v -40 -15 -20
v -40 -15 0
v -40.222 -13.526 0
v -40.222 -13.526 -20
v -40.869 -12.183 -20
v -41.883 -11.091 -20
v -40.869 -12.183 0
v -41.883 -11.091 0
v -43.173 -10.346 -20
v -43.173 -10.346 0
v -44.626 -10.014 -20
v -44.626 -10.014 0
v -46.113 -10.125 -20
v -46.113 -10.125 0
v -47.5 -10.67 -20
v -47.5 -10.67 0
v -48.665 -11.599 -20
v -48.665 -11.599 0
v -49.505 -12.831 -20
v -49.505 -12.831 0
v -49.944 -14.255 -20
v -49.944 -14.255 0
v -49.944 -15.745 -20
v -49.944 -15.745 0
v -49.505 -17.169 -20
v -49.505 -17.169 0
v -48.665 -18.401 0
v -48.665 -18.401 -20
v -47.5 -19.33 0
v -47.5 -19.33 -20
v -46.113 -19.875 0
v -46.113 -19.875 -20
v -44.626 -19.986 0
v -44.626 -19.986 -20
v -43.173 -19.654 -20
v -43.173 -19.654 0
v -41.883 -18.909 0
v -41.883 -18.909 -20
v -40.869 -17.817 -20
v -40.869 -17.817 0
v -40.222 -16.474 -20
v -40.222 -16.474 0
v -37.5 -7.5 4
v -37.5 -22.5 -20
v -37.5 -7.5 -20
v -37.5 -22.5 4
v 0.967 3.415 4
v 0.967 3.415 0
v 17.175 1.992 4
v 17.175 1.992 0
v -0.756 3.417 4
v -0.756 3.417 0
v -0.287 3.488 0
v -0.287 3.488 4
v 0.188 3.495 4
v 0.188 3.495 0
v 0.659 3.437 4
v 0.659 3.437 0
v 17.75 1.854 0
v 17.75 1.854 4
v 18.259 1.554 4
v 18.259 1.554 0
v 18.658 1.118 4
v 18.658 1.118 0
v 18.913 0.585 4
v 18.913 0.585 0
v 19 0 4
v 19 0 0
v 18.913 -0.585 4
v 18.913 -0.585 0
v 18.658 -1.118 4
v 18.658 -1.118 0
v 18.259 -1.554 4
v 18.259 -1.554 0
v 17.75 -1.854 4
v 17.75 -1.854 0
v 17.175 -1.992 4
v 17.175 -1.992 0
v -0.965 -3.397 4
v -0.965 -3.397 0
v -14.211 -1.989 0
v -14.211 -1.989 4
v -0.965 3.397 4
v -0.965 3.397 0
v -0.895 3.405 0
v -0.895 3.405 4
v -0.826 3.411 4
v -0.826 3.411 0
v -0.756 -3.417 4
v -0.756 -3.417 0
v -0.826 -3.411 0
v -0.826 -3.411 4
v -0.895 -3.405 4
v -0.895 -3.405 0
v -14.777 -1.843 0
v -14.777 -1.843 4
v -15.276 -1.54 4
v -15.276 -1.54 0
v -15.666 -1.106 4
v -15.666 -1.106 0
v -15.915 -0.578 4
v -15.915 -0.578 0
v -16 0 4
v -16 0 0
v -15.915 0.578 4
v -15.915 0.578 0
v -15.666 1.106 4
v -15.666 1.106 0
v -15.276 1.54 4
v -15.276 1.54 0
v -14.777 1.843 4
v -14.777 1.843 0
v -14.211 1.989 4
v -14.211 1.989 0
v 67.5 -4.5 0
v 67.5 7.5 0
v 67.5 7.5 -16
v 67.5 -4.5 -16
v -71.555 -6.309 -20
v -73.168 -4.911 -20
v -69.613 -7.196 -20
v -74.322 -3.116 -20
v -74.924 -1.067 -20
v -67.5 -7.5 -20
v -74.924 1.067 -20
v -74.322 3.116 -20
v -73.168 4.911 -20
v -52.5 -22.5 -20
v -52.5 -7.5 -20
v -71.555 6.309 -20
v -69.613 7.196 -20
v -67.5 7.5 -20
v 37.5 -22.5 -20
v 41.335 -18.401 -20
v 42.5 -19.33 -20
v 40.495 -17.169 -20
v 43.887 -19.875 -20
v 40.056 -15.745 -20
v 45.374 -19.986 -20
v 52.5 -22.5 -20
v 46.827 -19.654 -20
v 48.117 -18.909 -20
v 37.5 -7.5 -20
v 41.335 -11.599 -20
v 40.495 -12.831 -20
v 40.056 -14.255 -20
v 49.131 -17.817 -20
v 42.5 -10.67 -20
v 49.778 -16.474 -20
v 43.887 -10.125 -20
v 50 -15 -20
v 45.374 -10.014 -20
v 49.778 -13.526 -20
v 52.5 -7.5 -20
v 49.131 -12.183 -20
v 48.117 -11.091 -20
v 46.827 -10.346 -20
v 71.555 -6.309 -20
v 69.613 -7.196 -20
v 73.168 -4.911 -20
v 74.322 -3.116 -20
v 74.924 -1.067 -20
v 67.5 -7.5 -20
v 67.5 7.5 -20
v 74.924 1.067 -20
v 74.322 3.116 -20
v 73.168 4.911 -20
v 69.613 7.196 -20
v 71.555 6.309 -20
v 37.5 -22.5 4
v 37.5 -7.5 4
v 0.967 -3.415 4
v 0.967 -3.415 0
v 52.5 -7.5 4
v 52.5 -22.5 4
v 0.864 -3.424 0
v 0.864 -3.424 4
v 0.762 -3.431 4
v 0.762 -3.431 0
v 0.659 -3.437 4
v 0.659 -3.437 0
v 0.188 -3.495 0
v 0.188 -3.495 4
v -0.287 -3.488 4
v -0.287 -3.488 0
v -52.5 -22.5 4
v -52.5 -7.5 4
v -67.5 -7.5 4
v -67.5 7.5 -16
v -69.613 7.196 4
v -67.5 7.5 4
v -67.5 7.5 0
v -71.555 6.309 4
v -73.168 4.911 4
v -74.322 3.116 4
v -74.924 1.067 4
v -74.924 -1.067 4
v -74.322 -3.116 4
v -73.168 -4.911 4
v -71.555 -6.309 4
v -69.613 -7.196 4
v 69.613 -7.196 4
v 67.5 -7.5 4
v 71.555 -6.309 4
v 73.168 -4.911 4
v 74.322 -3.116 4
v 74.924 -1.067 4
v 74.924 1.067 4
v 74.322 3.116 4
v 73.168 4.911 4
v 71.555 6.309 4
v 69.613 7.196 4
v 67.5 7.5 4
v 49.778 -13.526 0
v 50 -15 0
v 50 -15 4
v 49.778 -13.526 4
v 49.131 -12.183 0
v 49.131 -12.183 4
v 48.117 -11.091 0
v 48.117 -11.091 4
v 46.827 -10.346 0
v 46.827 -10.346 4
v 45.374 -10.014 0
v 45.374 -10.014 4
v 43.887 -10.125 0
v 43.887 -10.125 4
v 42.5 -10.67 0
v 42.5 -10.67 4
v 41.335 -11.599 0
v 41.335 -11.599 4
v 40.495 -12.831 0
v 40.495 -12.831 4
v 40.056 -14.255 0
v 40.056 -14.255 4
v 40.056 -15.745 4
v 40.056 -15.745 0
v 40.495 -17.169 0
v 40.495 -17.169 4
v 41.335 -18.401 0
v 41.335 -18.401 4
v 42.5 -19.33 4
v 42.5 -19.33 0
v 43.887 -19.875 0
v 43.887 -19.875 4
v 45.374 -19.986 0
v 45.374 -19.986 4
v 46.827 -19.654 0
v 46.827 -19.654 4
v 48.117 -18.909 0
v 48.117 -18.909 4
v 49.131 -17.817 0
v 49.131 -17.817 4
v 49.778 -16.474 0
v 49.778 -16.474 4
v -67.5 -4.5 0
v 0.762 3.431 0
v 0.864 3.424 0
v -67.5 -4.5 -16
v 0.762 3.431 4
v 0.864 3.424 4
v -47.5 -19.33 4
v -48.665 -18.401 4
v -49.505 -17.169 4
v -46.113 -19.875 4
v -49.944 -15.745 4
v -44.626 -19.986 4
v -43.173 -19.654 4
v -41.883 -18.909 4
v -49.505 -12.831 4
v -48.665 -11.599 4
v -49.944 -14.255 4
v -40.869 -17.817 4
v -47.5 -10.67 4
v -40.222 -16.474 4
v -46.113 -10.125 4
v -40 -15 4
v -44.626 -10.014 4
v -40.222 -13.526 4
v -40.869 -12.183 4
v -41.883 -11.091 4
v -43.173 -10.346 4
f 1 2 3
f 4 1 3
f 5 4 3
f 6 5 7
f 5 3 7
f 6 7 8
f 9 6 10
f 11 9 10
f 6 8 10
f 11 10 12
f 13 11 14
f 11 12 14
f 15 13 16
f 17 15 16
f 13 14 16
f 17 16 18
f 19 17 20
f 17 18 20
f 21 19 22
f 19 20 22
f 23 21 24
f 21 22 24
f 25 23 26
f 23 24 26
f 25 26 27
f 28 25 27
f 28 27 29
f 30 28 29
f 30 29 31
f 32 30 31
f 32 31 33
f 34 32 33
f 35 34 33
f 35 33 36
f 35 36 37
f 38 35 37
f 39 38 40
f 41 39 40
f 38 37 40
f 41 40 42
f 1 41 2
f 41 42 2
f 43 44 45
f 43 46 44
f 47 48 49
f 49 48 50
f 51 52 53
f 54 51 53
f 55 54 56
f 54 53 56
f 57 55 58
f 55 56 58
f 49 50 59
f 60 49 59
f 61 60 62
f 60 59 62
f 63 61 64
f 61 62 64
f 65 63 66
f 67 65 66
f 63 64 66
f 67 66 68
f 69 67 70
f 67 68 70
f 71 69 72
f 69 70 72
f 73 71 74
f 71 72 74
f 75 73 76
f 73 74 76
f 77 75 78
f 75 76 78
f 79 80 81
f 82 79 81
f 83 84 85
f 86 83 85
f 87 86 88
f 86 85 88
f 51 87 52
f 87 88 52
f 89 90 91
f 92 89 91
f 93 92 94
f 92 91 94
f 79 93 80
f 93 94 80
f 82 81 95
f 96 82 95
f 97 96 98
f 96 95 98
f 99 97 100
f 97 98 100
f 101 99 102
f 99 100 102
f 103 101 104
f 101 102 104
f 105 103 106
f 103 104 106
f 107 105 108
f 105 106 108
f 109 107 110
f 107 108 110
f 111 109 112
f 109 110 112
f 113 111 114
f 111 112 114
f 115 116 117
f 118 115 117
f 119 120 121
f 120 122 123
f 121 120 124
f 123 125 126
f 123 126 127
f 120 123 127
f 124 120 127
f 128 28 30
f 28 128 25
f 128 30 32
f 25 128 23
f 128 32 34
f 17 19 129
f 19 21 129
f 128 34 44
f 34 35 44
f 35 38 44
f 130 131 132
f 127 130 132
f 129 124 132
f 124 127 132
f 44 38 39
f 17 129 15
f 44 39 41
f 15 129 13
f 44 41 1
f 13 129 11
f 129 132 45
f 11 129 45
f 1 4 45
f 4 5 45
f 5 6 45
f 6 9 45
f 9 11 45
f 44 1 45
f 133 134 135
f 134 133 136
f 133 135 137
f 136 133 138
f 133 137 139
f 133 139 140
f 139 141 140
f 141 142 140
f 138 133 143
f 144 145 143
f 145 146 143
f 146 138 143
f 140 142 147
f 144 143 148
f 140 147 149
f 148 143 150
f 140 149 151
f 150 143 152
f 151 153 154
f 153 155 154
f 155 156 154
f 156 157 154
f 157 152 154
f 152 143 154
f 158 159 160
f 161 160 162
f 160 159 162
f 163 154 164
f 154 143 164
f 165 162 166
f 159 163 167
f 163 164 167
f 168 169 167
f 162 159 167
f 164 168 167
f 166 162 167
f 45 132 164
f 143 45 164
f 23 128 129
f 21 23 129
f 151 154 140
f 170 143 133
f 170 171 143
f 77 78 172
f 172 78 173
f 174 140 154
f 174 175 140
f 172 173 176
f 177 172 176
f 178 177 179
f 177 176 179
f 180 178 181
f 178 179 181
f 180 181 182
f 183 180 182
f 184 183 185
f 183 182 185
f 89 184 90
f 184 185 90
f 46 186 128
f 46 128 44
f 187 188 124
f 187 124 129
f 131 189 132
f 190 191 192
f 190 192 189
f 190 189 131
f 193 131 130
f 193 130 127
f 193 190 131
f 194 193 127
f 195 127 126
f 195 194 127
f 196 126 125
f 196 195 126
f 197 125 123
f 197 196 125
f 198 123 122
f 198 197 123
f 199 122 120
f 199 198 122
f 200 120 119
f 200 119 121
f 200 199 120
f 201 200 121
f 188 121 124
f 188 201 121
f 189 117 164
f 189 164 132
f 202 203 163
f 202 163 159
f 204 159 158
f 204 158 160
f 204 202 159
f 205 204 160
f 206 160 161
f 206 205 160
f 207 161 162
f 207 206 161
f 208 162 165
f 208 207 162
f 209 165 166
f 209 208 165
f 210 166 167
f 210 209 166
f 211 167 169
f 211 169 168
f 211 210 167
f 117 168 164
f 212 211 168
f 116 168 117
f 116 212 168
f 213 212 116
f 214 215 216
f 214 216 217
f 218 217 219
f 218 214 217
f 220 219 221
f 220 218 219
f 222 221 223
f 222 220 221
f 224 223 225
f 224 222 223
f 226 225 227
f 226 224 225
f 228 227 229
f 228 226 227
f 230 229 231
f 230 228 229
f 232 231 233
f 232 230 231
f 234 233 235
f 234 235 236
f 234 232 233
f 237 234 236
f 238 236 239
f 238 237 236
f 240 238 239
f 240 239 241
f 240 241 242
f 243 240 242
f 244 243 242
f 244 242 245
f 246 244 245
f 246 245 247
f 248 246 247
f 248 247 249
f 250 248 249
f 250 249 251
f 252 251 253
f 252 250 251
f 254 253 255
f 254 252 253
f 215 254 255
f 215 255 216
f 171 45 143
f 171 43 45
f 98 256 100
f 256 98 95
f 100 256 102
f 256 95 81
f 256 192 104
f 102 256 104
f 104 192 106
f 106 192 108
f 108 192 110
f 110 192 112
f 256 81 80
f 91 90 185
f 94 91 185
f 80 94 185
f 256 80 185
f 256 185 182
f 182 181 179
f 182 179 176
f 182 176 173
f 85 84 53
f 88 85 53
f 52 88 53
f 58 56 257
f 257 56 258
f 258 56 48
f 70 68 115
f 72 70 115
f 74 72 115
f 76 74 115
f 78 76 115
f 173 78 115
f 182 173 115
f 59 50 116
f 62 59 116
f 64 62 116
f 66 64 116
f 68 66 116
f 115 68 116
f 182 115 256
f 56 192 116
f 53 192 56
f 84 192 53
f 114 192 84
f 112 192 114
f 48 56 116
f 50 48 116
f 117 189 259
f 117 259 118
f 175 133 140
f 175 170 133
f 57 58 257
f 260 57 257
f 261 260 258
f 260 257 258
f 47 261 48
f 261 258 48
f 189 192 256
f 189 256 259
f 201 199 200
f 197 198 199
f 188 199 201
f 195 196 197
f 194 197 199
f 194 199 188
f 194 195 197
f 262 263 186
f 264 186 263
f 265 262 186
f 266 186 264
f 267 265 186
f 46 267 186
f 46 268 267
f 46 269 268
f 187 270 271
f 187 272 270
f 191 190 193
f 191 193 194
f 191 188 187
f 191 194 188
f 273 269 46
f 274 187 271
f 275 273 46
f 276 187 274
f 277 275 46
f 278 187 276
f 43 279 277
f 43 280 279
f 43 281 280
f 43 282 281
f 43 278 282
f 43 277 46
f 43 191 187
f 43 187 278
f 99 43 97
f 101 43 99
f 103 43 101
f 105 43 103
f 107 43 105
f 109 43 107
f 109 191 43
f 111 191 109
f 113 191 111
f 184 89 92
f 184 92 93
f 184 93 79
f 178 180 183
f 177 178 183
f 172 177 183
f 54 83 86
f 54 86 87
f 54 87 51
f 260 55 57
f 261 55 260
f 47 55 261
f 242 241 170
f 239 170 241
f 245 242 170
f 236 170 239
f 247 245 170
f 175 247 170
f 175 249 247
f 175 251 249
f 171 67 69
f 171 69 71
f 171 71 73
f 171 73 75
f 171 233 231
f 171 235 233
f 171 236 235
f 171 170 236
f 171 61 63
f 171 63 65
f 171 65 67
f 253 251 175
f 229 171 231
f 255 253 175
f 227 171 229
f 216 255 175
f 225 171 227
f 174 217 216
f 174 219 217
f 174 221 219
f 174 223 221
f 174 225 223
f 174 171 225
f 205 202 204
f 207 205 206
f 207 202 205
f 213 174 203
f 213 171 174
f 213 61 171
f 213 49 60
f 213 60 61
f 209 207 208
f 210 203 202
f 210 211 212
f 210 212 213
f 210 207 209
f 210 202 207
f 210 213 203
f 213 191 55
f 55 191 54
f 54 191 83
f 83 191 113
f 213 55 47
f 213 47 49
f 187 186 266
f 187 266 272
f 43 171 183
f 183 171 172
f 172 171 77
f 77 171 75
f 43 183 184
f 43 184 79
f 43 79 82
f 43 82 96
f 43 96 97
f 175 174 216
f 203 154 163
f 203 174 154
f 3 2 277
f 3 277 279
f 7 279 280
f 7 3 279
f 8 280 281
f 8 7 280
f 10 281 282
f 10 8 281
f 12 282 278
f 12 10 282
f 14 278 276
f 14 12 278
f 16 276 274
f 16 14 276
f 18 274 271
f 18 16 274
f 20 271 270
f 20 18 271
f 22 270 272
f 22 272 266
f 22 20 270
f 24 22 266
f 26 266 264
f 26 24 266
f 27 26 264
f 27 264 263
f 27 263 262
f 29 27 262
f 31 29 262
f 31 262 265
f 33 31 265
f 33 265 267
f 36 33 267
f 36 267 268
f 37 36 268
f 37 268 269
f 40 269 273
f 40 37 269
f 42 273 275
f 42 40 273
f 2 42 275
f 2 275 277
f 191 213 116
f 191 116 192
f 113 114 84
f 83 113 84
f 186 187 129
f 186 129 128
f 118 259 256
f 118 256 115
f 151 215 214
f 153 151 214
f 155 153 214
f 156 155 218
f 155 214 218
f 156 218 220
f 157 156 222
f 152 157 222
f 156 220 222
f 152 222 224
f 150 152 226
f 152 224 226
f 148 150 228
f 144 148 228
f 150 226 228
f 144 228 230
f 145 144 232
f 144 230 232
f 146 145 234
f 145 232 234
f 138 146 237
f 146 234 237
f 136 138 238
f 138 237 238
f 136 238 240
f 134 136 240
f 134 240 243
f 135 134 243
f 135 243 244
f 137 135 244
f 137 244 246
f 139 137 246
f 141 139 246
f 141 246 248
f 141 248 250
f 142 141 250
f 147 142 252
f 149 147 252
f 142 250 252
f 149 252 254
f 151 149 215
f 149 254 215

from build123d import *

# Parameters (mm, degrees)
SKETCH1_R           = 5
BOSS_EXTRUDE1_DEPTH = 4
BOSS_EXTRUDE2_START = -20
SKETCH1_4_R         = 5
BOSS_EXTRUDE2_DEPTH = 20
SKETCH2_W           = 135
SKETCH2_H           = 16
CUT_EXTRUDE1_DEPTH  = 12


with BuildPart() as part:
    # Sketch1 → Boss-Extrude1 (new body)
    with BuildSketch(Plane.XY):
        with BuildLine():
            Line((52.5, -7.5), (67.5, -7.5))
            ThreePointArc((67.5, -7.5), (75, 0), (67.5, 7.5))
            Line((67.5, 7.5), (-67.5, 7.5))
            ThreePointArc((-67.5, 7.5), (-75, 0), (-67.5, -7.5))
            Line((-67.5, -7.5), (-52.5, -7.5))
            Line((-52.5, -7.5), (-52.5, -22.5))
            Line((-52.5, -22.5), (-37.5, -22.5))
            Line((-37.5, -22.5), (-37.5, -7.5))
            Line((-37.5, -7.5), (37.5, -7.5))
            Line((37.5, -7.5), (37.5, -22.5))
            Line((37.5, -22.5), (52.5, -22.5))
            Line((52.5, -22.5), (52.5, -7.5))
        make_face()
        with BuildLine():
            Line((-14.211482552, 1.988787352), (-0.965077795, 3.3973761))
            ThreePointArc((-0.965077795, 3.3973761), (-0.860540111, 3.407937274), (-0.755897232, 3.417399505))
            ThreePointArc((-0.755897232, 3.417399505), (-0.049360306, 3.49965192), (0.65921534, 3.437358744))
            ThreePointArc((0.65921534, 3.437358744), (0.81309385, 3.427430851), (0.966800983, 3.415131426))
            Line((0.966800983, 3.415131426), (17.174893203, 1.992338417))
            ThreePointArc((17.174893203, 1.992338417), (19, 0), (17.174893203, -1.992338417))
            Line((17.174893203, -1.992338417), (0.966800983, -3.415131426))
            ThreePointArc((0.966800983, -3.415131426), (0.81309385, -3.427430851), (0.65921534, -3.437358744))
            ThreePointArc((0.65921534, -3.437358744), (-0.049360306, -3.49965192), (-0.755897232, -3.417399505))
            ThreePointArc((-0.755897232, -3.417399505), (-0.860540111, -3.407937274), (-0.965077795, -3.3973761))
            Line((-0.965077795, -3.3973761), (-14.211482552, -1.988787352))
            ThreePointArc((-14.211482552, -1.988787352), (-16, 0), (-14.211482552, 1.988787352))
        make_face(mode=Mode.SUBTRACT)
        with Locations((45, -15)):
            Circle(SKETCH1_R, mode=Mode.SUBTRACT)
        with Locations((-45, -15)):
            Circle(SKETCH1_R, mode=Mode.SUBTRACT)
    extrude(amount=BOSS_EXTRUDE1_DEPTH)

    # Sketch1<4> → Boss-Extrude2 (add)
    with BuildSketch(Plane.XY.offset(BOSS_EXTRUDE2_START)):
        with BuildLine():
            Line((52.5, -7.5), (67.5, -7.5))
            ThreePointArc((67.5, -7.5), (75, 0), (67.5, 7.5))
            Line((67.5, 7.5), (-67.5, 7.5))
            ThreePointArc((-67.5, 7.5), (-75, 0), (-67.5, -7.5))
            Line((-67.5, -7.5), (-52.5, -7.5))
            Line((-52.5, -7.5), (-52.5, -22.5))
            Line((-52.5, -22.5), (-37.5, -22.5))
            Line((-37.5, -22.5), (-37.5, -7.5))
            Line((-37.5, -7.5), (37.5, -7.5))
            Line((37.5, -7.5), (37.5, -22.5))
            Line((37.5, -22.5), (52.5, -22.5))
            Line((52.5, -22.5), (52.5, -7.5))
        make_face()
        with Locations((45, -15)):
            Circle(SKETCH1_4_R, mode=Mode.SUBTRACT)
        with Locations((-45, -15)):
            Circle(SKETCH1_4_R, mode=Mode.SUBTRACT)
    extrude(amount=BOSS_EXTRUDE2_DEPTH)

    # Sketch2 → Cut-Extrude1 (cut)
    with BuildSketch(Plane(origin=(0, 7.5, 0), x_dir=(1, 0, 0), z_dir=(0, 1, 0))):
        with Locations((0, 8)):
            Rectangle(SKETCH2_W, SKETCH2_H)
    extrude(amount=-CUT_EXTRUDE1_DEPTH, mode=Mode.SUBTRACT)


solid = part.part
